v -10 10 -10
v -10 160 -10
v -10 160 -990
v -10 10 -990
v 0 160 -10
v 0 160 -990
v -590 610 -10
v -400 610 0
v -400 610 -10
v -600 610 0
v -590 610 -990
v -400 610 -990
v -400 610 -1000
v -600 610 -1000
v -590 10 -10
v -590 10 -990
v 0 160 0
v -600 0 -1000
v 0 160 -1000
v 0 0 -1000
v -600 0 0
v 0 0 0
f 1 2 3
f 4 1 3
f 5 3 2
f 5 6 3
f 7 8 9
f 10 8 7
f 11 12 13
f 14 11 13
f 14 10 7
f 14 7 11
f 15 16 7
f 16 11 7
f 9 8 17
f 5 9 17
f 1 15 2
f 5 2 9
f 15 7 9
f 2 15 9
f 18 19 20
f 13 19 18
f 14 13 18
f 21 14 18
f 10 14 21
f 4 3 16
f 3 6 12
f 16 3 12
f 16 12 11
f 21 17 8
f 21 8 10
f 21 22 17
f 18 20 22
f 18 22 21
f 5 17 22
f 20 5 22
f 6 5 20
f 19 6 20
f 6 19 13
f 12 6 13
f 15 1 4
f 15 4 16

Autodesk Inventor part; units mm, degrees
ref_plane "YZ Plane" through (0, 0, 0) normal (1, 0, 0) x (0, 1, 0)
ref_plane "XZ Plane" through (0, 0, 0) normal (0, 1, 0) x (-1, 0, 0)
ref_plane "XY Plane" through (0, 0, 0) normal (0, 0, 1) x (1, 0, 0)
sketch "Sketch2" plane through (0, 0, 0) normal (0, 1, 0) x (-1, 0, 0)
  line L0 (0, 0) -> (600, 0)
  line L1 (600, 0) -> (600, -1000)
  line L2 (600, -1000) -> (0, -1000)
  line L3 (0, -1000) -> (0, 0)
  dimension "d0" = 600
  dimension "d1" = 1000
extrude "Extrusion1" add sketch "Sketch2" along normal blind 10
sketch "Sketch3" plane through (-600, 0, 0) normal (0, 0, 1) x (1, 0, 0)
  line L0 (600, 10) -> (0, 10) projected
  line L1 (0, 10) -> (0, 610)
  line L2 (0, 610) -> (200, 610)
  line L3 (200, 610) -> (600, 160)
  line L4 (600, 160) -> (600, 10)
  line L5 (0, 10) -> (600, 10)
  line L6 (600, 160) -> (0, 160) construction
  point P0 (600, 0)
  dimension "d4" = 600
  dimension "d5" = 200
  dimension "d6" = 150
  dimension "d13" = 600
  dimension "d14" = 48.367
extrude "Extrusion2" add sketch "Sketch3" against normal blind 10
ref_plane "Work Plane1" through (0, 0, -500) normal (0, 0, -1) x (-1, 0, 0)
mirror "Mirror1" about plane through (0, 0, -500) normal (0, 0, -1) of "Extrusion2"
sketch "Sketch4" plane through (0, 0, 0) normal (1, 0, 0) x (0, 0, -1)
  line L0 (990, 10) -> (10, 10) projected
  line L1 (1000, 160) -> (990, 160) projected
  line L2 (10, 10) -> (990, 10)
  line L3 (990, 10) -> (990, 160)
  line L4 (990, 160) -> (10, 160)
  line L5 (10, 160) -> (10, 10)
  point P0 (0, 0)
extrude "Extrusion3" add sketch "Sketch4" against normal blind 10
sketch "Sketch5" plane through (-600, 0, -1000) normal (-1, 0, 0) x (0, 0, 1)
  line L0 (990, 10) -> (10, 10) projected
  line L1 (990, 10) -> (990, 610) projected
  line L2 (10, 10) -> (990, 10)
  line L3 (990, 10) -> (990, 610)
  line L4 (990, 610) -> (10, 610)
  line L5 (10, 610) -> (10, 10)
  point P0 (1000, 0)
extrude "Extrusion4" add sketch "Sketch5" against normal blind 10
properties part number "bois"
